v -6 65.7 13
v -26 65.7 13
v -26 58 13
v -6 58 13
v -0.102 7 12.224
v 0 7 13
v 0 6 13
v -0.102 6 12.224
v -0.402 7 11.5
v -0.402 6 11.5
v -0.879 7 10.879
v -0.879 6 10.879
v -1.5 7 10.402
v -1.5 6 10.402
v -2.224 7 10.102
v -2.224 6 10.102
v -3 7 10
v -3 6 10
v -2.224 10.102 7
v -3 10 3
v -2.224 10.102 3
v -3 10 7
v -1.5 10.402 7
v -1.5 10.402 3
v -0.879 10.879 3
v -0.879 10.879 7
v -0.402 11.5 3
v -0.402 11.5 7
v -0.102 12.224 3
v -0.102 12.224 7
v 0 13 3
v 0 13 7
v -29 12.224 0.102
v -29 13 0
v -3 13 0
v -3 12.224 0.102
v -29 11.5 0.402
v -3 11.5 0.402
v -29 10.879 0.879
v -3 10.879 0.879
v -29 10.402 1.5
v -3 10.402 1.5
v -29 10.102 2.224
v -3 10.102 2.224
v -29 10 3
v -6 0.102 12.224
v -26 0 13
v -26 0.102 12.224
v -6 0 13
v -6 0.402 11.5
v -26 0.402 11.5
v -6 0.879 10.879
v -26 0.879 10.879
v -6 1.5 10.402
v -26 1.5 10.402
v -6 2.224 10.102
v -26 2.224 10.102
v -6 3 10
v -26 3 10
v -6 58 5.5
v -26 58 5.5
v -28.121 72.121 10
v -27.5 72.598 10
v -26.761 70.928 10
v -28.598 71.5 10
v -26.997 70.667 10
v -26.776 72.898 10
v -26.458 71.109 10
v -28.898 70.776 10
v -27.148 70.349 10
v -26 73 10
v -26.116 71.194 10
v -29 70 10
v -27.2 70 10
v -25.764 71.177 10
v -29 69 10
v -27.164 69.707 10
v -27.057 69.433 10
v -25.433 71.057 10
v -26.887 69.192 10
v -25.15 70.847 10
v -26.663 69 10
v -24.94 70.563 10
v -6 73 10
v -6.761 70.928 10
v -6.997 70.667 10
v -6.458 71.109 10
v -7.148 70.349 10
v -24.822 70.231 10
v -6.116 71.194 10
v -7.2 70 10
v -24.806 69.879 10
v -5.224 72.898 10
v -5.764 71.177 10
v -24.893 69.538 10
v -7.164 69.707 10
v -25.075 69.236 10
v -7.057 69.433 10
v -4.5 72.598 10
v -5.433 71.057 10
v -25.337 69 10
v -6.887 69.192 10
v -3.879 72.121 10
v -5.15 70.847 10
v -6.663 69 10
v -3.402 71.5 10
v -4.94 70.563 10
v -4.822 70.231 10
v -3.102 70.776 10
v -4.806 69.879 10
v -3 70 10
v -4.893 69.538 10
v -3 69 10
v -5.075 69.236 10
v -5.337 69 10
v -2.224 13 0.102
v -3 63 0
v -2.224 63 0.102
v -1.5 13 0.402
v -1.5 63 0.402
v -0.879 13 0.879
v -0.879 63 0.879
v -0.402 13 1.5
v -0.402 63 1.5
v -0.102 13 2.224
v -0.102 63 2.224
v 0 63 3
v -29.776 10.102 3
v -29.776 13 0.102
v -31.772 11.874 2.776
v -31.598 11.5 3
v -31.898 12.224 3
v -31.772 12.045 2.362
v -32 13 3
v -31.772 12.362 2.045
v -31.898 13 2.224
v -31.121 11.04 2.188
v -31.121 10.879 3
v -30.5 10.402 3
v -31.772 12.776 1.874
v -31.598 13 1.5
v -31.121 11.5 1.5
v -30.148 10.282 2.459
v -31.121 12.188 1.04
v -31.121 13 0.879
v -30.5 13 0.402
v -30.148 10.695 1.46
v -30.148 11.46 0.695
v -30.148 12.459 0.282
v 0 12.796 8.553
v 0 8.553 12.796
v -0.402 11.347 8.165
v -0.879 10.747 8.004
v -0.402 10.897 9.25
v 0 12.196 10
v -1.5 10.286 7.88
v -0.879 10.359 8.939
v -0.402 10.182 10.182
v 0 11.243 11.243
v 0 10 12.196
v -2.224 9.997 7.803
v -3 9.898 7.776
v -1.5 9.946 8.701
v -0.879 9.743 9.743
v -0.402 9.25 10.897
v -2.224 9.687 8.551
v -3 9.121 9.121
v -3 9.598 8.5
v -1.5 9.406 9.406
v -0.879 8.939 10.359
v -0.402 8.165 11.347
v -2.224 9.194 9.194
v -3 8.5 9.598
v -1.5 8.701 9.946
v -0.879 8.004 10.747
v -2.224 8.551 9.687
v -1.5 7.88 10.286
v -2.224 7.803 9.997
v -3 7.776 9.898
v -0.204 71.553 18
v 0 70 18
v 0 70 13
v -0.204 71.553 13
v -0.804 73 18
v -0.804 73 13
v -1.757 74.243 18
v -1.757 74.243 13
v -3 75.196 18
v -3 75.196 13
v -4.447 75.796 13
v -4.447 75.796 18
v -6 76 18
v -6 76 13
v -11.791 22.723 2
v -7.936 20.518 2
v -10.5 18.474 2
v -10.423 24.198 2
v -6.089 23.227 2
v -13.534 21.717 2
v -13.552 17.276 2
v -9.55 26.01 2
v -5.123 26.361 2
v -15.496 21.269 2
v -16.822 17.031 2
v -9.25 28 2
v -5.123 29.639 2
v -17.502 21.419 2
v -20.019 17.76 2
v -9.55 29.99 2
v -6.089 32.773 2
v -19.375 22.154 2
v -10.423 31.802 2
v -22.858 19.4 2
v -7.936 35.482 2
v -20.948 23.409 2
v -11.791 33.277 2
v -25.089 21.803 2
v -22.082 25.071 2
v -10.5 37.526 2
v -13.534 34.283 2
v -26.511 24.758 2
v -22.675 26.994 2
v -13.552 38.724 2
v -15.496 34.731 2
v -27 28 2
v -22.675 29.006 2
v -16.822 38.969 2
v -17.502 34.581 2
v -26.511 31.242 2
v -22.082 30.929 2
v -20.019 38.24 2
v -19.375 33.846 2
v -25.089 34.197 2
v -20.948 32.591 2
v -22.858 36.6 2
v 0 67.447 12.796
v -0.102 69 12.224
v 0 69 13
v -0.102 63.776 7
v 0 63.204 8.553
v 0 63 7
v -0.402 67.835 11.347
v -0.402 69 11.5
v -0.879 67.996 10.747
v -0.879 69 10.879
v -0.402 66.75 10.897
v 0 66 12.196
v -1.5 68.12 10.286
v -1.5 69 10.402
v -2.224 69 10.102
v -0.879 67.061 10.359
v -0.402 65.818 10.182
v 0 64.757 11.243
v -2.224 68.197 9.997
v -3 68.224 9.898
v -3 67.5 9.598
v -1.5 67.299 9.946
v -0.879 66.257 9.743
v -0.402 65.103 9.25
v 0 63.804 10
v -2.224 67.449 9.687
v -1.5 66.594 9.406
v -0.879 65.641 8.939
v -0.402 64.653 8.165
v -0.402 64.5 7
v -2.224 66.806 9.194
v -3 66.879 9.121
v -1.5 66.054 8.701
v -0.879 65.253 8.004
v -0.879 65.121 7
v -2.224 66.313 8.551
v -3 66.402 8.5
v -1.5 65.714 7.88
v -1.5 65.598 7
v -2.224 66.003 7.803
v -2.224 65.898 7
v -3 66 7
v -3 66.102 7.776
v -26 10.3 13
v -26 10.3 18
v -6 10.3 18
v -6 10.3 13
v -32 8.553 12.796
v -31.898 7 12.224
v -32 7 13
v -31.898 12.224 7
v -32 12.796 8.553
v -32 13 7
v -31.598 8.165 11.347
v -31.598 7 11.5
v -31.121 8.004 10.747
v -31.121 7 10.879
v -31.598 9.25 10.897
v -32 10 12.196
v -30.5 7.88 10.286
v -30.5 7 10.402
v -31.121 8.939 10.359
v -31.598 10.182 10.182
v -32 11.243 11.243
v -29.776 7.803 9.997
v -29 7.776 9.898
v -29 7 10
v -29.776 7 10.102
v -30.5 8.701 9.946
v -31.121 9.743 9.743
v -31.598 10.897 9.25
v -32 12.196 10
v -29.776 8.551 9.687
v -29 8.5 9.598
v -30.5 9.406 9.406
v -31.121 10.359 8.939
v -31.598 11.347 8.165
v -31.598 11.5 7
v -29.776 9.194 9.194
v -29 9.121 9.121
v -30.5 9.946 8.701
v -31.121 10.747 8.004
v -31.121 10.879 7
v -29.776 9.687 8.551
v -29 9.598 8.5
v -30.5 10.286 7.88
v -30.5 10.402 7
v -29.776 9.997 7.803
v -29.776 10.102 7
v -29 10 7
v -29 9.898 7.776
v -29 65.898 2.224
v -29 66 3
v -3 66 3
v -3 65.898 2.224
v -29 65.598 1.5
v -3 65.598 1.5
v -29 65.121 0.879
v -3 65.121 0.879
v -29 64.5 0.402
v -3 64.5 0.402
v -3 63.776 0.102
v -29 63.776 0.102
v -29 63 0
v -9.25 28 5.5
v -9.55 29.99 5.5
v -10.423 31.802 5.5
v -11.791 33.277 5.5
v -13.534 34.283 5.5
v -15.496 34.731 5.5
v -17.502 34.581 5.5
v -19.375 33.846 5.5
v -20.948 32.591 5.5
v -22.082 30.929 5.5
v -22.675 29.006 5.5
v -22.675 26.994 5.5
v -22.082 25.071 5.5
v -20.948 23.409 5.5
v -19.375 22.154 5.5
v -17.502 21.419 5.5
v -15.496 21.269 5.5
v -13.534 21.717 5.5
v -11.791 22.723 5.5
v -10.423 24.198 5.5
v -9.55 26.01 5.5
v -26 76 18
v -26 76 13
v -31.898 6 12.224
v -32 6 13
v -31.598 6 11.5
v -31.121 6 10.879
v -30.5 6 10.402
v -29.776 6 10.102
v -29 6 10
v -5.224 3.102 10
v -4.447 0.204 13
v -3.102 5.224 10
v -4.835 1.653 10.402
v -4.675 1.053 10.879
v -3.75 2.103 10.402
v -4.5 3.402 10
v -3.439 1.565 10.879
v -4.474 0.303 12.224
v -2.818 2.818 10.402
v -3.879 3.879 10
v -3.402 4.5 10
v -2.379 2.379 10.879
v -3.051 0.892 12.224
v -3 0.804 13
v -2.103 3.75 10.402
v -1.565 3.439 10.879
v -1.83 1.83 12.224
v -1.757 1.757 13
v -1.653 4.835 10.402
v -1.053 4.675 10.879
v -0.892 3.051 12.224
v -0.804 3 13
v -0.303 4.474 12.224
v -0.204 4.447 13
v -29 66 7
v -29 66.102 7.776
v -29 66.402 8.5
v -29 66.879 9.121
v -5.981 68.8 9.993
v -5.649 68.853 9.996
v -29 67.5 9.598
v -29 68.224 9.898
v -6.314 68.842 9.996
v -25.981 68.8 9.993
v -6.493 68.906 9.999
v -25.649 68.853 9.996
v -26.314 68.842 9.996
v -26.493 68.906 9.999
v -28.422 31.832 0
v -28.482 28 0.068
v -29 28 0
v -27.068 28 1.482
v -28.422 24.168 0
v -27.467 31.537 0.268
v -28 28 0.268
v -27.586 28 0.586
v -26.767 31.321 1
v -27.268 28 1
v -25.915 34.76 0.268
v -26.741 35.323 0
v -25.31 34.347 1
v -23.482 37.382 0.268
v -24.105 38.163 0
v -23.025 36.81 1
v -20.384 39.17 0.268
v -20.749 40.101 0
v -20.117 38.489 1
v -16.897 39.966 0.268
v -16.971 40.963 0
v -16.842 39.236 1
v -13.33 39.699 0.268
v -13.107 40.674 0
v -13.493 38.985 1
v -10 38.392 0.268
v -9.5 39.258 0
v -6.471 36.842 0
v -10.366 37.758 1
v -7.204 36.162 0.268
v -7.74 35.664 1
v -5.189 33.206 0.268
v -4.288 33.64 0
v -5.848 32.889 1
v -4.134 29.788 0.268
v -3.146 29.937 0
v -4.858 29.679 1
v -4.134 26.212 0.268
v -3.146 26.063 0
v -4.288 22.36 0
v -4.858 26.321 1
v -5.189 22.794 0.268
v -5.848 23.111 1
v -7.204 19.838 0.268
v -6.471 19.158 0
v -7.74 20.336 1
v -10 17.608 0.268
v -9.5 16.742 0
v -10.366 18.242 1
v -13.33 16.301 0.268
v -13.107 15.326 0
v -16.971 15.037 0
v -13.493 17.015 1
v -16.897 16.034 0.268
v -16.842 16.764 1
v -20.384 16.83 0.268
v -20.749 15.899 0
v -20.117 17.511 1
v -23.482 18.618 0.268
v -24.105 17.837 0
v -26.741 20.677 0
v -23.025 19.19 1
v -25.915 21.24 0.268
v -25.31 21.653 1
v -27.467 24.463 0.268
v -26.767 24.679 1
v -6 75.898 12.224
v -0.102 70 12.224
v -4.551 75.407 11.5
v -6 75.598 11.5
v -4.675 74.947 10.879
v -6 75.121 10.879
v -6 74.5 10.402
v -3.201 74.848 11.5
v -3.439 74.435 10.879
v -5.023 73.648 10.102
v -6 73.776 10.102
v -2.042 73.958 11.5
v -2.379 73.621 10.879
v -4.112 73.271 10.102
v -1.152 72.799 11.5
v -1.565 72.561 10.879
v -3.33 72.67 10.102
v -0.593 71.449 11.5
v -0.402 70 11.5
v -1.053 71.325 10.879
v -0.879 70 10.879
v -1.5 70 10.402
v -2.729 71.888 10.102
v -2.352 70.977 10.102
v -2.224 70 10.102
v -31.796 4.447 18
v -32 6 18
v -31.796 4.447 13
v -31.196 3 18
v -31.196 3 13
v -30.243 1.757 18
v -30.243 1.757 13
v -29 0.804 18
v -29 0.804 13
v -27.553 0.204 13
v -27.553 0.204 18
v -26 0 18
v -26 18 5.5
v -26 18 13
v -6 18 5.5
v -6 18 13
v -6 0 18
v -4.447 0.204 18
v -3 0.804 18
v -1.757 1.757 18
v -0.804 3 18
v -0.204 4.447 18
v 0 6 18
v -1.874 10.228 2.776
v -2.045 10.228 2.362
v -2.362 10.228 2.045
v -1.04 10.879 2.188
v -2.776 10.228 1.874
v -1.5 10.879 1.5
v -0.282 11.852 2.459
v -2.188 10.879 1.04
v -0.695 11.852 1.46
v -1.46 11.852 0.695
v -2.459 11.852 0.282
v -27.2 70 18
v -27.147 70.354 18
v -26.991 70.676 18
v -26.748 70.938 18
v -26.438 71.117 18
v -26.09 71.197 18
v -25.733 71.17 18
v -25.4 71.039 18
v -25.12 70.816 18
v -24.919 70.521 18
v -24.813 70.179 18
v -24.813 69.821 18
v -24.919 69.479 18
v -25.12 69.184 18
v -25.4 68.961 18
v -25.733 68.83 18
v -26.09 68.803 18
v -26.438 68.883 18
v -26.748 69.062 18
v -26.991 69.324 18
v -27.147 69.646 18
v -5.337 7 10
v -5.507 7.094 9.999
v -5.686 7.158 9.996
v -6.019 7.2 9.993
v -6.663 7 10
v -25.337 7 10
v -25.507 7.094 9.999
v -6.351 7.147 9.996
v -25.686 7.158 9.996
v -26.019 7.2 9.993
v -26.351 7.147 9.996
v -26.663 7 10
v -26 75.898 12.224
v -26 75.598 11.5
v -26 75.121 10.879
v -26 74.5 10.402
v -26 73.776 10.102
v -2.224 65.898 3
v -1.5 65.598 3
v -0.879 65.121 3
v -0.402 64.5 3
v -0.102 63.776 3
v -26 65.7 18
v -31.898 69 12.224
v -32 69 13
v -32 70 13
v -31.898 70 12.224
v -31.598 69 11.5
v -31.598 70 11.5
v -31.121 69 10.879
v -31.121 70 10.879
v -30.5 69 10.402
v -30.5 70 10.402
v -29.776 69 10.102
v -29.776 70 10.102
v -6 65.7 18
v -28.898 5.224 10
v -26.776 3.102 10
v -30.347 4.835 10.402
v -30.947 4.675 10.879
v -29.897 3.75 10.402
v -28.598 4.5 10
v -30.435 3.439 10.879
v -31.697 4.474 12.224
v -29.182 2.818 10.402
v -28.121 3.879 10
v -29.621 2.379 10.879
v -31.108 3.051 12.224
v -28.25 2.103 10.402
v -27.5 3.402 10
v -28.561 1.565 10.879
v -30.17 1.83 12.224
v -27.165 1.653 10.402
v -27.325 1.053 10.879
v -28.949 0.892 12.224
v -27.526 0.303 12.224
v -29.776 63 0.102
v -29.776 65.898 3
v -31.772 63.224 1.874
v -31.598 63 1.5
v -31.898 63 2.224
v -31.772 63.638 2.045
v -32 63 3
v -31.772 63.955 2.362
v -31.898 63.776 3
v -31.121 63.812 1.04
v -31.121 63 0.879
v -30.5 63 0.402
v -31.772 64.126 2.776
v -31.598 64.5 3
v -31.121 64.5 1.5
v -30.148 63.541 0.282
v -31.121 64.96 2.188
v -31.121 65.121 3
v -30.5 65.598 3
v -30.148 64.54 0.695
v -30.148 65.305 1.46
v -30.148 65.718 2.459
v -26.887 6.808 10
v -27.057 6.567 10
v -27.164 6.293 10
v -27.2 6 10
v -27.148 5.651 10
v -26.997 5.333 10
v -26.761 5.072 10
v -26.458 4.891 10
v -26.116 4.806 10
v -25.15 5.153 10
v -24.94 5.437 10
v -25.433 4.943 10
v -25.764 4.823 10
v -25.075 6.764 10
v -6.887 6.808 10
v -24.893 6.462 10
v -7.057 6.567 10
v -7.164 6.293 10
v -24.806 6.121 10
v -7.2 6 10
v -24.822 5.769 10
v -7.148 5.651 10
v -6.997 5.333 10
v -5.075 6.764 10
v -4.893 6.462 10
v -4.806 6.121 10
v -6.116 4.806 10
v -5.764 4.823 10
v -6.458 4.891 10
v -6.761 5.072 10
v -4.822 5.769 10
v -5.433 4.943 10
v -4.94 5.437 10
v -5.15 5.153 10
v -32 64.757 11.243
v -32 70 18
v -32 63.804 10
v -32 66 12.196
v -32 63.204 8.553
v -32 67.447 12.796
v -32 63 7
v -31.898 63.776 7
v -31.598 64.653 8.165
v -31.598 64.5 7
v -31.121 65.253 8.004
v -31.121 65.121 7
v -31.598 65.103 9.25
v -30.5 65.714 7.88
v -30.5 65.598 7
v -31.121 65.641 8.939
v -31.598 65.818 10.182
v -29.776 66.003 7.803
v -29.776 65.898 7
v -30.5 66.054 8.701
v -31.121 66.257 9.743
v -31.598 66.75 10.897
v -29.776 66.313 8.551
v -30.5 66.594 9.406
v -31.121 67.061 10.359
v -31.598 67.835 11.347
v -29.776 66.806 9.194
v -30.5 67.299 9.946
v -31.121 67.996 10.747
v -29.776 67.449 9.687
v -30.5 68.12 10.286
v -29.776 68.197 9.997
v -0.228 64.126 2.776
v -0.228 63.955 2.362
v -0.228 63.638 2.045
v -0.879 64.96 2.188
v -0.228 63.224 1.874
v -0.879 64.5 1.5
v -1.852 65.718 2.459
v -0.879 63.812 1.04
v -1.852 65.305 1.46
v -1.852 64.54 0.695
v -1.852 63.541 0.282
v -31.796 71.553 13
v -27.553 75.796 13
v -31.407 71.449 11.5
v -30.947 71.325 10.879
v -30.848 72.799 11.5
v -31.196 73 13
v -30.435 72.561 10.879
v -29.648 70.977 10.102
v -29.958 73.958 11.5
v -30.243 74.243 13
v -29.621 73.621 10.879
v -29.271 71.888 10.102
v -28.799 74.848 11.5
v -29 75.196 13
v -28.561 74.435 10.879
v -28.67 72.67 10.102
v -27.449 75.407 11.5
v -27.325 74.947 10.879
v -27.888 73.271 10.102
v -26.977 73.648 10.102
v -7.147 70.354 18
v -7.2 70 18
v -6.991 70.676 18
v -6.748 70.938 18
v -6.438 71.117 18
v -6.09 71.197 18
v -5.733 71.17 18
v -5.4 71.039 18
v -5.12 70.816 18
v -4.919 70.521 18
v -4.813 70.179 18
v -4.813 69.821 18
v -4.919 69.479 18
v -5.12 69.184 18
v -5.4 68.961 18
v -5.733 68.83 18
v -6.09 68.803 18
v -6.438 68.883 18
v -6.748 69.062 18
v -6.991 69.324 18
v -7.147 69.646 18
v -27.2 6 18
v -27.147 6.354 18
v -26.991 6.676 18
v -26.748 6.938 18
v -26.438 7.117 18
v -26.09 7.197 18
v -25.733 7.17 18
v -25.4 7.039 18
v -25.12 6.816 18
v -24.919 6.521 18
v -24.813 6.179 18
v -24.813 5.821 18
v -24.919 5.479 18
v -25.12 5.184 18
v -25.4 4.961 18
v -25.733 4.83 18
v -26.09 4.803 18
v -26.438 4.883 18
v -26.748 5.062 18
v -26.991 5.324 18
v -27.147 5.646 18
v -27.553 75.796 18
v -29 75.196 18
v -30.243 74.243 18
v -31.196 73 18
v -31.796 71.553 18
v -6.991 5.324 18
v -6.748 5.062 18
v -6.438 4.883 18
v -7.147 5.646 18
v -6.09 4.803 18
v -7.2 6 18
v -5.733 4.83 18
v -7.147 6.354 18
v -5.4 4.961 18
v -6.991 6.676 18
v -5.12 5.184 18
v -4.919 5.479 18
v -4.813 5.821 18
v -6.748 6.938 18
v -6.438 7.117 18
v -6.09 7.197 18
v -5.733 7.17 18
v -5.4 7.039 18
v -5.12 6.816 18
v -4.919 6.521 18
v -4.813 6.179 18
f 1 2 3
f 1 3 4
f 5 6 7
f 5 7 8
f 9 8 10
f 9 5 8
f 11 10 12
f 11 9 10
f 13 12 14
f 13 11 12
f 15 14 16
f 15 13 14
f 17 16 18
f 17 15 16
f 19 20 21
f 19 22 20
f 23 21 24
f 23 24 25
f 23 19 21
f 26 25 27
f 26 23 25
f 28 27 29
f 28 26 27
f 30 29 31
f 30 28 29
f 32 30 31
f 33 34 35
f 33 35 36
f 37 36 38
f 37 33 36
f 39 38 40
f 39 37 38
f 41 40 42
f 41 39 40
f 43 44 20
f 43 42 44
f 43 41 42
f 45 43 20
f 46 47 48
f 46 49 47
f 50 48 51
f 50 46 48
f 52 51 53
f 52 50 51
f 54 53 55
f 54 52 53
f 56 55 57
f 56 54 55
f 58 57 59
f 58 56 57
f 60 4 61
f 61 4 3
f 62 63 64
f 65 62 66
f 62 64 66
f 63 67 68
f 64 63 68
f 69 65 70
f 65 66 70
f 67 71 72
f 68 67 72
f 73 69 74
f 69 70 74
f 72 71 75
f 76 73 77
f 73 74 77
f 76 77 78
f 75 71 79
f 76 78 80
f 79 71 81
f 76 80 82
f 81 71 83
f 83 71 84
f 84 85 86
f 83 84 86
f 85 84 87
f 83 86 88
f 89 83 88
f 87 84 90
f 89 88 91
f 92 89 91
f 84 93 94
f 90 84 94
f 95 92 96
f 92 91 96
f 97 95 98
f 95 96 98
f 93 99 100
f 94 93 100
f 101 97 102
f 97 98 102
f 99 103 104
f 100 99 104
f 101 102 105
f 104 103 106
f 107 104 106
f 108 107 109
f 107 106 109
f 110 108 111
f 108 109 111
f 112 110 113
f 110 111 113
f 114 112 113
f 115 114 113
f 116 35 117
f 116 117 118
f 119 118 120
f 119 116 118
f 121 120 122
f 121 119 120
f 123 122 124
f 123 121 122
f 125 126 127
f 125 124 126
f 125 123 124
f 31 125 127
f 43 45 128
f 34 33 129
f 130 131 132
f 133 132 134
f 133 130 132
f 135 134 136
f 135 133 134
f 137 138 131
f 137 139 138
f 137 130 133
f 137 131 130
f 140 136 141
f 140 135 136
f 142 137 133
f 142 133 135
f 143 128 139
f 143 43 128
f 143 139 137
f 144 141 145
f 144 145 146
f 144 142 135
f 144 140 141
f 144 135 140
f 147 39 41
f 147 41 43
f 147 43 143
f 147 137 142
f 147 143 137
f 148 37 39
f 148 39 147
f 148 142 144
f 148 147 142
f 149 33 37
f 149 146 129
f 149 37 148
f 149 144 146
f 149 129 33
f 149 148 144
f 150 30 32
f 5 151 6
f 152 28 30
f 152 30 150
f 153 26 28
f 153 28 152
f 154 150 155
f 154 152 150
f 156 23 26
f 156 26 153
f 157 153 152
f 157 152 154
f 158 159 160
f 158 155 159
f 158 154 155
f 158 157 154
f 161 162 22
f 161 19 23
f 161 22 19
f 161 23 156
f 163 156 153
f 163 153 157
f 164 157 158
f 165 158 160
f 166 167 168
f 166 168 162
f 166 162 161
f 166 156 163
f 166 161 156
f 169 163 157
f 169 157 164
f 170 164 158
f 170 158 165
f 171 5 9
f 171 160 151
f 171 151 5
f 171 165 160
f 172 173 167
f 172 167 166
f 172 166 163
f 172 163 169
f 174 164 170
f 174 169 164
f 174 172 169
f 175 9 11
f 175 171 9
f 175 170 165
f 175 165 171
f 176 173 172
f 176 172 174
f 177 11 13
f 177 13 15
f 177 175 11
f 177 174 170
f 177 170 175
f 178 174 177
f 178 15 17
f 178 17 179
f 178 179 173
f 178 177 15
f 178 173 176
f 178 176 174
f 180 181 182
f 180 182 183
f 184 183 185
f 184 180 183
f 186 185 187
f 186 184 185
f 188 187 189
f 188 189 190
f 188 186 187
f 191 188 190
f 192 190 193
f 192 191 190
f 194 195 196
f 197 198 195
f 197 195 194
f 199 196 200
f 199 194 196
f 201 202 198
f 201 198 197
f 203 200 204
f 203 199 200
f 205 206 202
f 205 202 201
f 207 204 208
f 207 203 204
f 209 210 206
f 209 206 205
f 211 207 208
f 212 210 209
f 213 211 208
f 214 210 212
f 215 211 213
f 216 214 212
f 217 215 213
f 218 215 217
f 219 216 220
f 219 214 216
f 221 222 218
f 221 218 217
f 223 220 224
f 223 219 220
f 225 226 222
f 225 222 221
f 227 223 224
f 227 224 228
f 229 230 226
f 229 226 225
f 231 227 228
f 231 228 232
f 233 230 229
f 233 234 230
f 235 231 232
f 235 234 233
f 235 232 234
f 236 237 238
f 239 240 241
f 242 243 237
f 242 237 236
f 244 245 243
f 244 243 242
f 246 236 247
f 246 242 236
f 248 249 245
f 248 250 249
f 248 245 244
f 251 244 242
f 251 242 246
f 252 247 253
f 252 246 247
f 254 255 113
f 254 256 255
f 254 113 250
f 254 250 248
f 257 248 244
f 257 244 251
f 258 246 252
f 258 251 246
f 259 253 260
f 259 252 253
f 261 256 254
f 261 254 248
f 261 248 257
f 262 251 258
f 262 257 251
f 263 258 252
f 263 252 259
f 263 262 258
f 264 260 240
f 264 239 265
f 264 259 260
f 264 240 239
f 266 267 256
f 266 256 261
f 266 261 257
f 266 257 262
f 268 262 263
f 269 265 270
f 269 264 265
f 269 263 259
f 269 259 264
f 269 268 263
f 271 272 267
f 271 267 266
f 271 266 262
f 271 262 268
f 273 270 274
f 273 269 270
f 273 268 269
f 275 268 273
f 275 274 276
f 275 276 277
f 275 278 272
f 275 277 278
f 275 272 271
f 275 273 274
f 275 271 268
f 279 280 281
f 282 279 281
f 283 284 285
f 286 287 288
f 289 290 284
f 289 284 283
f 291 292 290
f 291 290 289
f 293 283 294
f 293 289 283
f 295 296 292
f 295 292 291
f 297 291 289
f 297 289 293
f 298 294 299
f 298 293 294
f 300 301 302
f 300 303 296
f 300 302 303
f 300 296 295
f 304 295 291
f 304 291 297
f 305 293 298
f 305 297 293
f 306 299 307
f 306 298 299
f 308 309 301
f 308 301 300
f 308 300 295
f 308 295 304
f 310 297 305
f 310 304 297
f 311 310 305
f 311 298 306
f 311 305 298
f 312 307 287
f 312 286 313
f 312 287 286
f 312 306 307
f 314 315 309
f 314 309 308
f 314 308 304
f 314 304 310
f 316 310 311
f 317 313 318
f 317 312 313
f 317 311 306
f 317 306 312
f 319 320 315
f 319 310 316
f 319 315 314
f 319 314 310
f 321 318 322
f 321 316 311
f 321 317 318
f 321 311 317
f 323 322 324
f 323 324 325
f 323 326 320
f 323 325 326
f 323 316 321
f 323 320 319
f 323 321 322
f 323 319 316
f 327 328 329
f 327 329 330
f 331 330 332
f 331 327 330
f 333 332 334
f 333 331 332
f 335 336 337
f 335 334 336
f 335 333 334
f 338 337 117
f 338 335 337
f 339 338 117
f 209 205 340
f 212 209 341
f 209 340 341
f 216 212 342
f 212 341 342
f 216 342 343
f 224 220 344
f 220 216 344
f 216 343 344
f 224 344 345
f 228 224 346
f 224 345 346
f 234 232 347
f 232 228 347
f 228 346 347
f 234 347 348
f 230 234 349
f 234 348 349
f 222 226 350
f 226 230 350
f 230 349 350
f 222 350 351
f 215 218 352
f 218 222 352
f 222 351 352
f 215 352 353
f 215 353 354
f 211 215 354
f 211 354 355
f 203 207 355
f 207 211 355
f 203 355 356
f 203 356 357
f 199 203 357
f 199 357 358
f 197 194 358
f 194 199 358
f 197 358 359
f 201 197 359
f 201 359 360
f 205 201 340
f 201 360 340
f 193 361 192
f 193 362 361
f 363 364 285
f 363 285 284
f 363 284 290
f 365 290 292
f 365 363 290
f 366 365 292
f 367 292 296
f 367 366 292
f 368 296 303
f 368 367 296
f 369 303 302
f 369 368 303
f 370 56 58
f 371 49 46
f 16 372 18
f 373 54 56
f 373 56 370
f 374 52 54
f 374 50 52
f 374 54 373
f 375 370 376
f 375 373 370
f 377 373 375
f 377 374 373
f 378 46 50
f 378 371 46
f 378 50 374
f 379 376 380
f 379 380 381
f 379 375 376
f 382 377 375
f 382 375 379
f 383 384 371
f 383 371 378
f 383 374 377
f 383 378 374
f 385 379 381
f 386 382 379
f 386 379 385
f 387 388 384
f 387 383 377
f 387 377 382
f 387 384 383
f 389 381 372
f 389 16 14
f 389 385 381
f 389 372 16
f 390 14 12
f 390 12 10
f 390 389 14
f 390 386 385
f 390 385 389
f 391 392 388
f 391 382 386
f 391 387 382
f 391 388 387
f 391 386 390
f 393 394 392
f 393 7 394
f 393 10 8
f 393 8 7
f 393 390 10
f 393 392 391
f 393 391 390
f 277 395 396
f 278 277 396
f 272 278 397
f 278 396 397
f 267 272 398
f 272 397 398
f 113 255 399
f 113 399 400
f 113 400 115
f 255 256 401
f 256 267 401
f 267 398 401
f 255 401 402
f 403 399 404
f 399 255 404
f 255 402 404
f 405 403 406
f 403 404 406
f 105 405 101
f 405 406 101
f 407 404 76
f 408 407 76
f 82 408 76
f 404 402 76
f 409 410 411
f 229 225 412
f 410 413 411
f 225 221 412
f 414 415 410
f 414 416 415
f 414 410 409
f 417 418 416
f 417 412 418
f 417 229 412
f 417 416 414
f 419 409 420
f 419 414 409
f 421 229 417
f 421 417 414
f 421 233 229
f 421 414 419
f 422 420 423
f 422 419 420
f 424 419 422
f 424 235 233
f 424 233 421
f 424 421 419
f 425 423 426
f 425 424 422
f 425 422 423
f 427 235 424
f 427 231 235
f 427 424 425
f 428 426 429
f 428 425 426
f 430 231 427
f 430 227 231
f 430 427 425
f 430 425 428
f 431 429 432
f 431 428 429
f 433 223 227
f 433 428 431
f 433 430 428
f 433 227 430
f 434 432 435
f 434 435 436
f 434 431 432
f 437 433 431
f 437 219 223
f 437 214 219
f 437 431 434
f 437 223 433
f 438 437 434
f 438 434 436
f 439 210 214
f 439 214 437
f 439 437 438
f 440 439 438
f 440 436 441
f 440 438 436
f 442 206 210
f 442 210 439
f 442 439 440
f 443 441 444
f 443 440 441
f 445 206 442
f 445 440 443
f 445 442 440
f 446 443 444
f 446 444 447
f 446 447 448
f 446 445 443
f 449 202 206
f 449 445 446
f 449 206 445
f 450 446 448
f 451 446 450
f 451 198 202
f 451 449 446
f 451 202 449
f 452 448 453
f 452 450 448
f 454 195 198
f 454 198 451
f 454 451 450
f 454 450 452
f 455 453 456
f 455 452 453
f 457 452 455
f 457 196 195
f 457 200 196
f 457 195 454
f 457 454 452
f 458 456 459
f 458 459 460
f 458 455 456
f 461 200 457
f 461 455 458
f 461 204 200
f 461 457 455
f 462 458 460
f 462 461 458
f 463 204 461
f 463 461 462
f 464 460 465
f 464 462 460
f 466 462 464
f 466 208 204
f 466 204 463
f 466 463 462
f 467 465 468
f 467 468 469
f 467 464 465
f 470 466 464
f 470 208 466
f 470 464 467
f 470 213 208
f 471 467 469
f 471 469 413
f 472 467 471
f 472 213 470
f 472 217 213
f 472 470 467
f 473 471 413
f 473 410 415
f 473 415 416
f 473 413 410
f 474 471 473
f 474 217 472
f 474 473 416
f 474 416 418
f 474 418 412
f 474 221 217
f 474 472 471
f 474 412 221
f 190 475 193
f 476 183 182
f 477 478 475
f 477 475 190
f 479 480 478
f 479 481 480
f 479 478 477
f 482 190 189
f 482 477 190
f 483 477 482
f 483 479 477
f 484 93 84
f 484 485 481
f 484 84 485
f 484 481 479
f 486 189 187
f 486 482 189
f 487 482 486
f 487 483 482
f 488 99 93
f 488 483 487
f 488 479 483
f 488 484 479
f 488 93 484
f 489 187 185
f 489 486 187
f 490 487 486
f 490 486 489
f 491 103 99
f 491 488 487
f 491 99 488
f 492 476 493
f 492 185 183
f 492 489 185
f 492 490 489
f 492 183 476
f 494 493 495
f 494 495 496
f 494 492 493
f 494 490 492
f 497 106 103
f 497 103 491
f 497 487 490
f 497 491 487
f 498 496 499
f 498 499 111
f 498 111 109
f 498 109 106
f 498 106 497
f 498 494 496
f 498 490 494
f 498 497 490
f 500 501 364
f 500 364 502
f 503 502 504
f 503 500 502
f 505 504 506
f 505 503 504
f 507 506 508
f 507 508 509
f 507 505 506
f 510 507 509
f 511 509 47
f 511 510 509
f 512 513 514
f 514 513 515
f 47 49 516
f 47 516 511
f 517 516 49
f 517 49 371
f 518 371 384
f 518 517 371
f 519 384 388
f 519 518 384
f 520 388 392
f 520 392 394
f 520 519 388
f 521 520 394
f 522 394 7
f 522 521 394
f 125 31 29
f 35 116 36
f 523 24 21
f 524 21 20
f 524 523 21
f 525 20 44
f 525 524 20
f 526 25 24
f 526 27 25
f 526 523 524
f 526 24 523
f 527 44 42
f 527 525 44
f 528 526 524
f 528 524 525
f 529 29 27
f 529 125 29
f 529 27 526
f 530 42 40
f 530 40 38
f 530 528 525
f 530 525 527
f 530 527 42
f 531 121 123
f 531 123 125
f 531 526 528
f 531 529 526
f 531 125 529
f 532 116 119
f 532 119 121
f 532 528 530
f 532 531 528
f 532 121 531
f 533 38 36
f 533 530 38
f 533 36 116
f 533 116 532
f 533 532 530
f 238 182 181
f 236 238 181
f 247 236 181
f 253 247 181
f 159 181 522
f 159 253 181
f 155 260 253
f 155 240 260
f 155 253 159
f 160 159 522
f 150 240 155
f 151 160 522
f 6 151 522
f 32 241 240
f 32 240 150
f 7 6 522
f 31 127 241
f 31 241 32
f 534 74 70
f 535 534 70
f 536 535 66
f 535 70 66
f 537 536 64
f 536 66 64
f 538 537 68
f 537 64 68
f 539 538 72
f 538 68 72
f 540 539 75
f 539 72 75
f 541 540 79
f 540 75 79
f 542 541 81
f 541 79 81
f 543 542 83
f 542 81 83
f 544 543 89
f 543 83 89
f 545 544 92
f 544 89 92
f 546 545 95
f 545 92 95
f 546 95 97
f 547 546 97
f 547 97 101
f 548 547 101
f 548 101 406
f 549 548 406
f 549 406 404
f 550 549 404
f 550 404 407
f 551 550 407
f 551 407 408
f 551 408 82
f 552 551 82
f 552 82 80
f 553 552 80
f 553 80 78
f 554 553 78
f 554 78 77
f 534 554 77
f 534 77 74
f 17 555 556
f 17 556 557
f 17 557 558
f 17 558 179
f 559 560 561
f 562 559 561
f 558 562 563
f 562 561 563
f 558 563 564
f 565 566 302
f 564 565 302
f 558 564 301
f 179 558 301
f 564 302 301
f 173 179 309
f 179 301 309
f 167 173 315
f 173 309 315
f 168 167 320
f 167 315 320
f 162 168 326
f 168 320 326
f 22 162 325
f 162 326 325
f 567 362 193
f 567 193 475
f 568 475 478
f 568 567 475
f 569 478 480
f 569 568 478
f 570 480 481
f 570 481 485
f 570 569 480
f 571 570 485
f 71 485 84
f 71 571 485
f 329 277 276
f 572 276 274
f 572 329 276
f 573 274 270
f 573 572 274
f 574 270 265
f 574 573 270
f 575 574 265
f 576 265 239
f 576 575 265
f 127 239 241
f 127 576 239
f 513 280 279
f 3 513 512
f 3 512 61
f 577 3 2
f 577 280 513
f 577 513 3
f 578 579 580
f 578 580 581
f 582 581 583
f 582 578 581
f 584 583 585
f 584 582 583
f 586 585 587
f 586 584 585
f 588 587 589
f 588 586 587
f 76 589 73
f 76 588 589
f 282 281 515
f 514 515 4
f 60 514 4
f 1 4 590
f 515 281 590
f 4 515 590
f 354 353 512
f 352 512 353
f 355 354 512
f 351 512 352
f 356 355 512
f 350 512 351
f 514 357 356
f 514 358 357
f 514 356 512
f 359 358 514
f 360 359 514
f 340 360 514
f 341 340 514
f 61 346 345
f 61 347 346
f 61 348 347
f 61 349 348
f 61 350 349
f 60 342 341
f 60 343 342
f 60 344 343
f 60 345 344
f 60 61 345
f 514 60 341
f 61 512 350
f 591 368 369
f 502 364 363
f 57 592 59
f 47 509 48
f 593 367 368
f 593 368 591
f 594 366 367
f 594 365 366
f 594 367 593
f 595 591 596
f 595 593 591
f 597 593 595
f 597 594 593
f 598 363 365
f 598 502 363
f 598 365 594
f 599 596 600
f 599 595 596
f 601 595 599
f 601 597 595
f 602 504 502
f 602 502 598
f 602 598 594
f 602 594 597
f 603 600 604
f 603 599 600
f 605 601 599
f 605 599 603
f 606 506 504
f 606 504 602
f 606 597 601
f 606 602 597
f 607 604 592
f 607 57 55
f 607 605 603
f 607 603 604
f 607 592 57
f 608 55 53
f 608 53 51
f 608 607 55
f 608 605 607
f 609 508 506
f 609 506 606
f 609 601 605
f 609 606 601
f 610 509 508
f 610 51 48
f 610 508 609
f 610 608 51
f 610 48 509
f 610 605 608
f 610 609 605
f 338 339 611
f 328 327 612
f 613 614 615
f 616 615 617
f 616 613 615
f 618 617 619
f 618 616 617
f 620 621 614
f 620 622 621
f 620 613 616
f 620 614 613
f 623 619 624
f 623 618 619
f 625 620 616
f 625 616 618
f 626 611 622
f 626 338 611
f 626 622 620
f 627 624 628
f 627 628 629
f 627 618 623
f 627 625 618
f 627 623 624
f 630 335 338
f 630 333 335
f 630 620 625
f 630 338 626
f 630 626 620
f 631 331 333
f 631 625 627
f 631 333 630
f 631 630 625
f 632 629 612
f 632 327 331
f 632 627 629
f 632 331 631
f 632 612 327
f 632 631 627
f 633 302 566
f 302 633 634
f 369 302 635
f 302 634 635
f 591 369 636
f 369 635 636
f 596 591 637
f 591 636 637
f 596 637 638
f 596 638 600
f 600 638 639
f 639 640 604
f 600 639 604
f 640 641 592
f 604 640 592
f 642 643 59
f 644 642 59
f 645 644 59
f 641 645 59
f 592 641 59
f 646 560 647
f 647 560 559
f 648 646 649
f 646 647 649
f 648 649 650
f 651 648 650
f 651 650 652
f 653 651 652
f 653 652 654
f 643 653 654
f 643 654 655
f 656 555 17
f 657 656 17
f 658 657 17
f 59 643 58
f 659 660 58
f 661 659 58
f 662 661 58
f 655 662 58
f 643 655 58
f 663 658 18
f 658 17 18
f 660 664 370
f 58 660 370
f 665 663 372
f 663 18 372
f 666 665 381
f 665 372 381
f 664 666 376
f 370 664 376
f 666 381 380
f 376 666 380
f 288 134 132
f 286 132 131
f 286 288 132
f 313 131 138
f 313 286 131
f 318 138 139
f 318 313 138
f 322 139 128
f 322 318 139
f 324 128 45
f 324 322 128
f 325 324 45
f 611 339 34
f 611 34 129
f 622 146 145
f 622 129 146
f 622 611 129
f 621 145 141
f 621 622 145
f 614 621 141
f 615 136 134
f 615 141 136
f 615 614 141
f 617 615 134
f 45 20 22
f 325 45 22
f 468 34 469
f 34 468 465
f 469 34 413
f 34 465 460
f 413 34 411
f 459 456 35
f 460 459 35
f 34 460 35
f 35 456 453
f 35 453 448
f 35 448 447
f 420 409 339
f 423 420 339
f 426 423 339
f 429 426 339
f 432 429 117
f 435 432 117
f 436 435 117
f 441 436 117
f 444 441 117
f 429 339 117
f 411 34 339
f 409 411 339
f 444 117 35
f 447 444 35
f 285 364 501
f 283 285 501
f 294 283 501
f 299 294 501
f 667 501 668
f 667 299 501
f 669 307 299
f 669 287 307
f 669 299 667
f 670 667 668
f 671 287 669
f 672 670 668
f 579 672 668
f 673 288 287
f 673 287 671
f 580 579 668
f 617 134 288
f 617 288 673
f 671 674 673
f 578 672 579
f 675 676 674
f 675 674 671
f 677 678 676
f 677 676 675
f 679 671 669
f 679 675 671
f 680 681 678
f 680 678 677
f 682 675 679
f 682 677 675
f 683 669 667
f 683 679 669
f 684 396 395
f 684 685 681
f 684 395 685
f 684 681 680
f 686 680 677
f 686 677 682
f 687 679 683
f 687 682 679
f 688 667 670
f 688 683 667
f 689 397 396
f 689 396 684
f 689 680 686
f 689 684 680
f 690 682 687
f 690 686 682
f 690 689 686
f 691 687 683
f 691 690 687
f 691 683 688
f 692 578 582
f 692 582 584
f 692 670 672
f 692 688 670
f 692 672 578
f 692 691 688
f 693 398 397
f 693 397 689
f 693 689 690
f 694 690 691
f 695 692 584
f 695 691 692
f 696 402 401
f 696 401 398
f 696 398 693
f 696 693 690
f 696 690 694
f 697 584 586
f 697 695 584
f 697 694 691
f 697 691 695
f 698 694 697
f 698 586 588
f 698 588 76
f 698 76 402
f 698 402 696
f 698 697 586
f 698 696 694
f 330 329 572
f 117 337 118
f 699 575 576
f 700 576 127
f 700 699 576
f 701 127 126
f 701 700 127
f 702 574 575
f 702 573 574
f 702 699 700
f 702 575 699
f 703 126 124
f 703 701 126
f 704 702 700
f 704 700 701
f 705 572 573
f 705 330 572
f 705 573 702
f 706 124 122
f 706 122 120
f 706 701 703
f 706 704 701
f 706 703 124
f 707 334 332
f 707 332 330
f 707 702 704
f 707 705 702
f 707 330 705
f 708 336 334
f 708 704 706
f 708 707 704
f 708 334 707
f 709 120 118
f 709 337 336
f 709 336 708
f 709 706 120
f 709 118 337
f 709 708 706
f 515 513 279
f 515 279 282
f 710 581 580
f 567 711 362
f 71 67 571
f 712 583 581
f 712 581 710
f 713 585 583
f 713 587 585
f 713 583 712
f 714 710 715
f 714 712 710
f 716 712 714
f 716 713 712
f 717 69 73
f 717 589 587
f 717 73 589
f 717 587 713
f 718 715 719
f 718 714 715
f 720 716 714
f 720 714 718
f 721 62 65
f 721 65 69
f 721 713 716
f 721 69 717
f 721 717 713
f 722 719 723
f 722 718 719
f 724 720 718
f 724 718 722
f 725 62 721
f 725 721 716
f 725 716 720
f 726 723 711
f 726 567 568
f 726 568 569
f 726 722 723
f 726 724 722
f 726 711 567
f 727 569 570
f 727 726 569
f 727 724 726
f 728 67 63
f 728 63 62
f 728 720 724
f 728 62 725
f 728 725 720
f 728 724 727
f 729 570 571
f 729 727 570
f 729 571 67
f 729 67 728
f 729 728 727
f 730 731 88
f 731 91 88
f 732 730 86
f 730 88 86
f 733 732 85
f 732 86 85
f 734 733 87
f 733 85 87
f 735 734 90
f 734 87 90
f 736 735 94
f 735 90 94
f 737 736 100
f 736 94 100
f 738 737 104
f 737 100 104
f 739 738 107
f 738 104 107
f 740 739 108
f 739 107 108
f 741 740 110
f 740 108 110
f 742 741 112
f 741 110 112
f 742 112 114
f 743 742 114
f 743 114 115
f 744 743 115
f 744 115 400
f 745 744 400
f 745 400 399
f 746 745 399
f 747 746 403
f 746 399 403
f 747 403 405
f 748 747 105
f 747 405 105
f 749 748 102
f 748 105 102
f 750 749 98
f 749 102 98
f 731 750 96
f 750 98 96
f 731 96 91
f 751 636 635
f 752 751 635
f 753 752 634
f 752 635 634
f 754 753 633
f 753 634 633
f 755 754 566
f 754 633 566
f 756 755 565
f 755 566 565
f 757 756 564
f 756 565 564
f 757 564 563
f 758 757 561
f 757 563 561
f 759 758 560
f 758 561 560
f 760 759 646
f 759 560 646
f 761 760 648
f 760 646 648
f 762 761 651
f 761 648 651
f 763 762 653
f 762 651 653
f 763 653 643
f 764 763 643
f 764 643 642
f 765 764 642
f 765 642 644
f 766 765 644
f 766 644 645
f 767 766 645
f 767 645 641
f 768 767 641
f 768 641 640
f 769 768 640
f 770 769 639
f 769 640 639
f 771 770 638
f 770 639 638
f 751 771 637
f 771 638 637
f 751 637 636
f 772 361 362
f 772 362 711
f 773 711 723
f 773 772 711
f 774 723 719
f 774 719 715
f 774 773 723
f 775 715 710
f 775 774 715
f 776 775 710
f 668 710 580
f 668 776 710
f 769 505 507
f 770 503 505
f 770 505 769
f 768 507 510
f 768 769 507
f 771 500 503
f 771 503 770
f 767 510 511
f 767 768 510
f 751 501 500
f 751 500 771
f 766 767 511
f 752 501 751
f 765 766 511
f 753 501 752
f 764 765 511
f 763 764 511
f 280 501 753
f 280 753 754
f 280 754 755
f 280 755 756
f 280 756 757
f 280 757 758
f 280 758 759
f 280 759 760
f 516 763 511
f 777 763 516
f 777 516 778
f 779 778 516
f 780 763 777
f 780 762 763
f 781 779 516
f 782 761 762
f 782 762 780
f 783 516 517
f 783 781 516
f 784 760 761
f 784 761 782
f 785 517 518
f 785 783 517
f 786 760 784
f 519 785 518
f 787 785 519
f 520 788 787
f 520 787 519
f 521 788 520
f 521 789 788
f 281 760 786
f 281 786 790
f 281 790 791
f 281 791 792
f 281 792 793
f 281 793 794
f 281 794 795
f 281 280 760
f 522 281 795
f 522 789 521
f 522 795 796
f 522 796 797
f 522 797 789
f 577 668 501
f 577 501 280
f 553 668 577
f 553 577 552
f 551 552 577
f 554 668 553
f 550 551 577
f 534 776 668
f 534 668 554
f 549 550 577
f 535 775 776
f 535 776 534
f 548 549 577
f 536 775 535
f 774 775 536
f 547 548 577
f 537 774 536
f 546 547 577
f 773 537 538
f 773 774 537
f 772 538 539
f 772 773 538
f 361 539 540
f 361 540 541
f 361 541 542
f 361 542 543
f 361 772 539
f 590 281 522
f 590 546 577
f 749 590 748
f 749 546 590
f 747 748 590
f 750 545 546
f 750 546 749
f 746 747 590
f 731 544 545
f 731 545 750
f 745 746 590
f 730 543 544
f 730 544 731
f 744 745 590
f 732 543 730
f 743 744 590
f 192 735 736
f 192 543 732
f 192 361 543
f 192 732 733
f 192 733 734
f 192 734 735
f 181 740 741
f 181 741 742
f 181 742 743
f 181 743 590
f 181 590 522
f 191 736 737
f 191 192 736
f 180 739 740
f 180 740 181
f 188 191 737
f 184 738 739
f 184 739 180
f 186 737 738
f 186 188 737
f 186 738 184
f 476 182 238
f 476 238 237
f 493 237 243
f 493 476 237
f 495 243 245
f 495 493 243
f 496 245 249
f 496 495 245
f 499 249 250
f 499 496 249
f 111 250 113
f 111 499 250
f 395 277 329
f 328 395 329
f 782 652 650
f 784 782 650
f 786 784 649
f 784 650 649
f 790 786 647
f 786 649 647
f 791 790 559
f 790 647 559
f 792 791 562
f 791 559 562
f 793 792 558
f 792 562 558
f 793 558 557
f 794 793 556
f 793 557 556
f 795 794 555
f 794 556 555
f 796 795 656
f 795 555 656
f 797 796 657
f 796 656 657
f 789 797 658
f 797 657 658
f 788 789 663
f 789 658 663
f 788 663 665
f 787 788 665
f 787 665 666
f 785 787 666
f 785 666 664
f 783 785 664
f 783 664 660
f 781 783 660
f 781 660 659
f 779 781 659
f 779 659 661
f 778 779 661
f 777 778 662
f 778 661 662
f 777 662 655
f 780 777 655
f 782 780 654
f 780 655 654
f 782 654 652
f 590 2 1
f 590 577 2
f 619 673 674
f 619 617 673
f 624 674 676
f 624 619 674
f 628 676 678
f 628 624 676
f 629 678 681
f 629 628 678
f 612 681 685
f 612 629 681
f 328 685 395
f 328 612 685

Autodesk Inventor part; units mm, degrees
ref_plane "YZ Plane" through (0, 0, 0) normal (1, 0, 0) x (0, 1, 0)
ref_plane "XZ Plane" through (0, 0, 0) normal (0, 1, 0) x (-1, 0, 0)
ref_plane "XY Plane" through (0, 0, 0) normal (0, 0, 1) x (1, 0, 0)
sketch "Sketch1" plane through (0, 0, 0) normal (0, 0, 1) x (1, 0, 0)
  line L0 (0, 0) -> (-32, 0)
  line L1 (-32, 0) -> (-32, 76)
  line L2 (-32, 76) -> (0, 76)
  line L3 (0, 76) -> (0, 0)
  dimension "d0" = 32
  dimension "d1" = 76
extrude "Extrusion1" add sketch "Sketch1" along normal blind 18
fillet "Fillet1" radius 6 4 edges at (0, 76, 9) (-32, 76, 9) (0, 0, 9) (-32, 0, 9)
sketch "Sketch2" plane through (0, 0, 18) normal (0, 0, 1) x (1, 0, 0)
  line L0 (-6, 58) -> (-26, 58)
  line L1 (-26, 58) -> (-26, 18)
  line L2 (-26, 18) -> (-6, 18)
  line L3 (-6, 18) -> (-6, 58)
  line L4 (-6, 76) -> (-26, 76) projected
  line L5 (0, 6) -> (0, 70) projected
  point P0 (0, 0)
  dimension "d5" = 20
  dimension "d6" = 40
  dimension "d7" = 18
  dimension "d8" = 6
extrude "Extrusion2" cut sketch "Sketch2" against normal blind 12.5
sketch "Sketch3" plane through (0, 0, 5.5) normal (0, 0, 1) x (1, 0, 0)
  circle A0 centre (-16, 28) radius 6.75
  line L0 (-6, 58) -> (-6, 18) projected
  line L1 (-6, 18) -> (-26, 18) projected
  point P0 (0, 0)
  dimension "d11" = 13.5
  dimension "d12" = 10
  dimension "d13" = 10
extrude "Extrusion3" cut sketch "Sketch3" against normal up to surface (5.5 mm away)
sketch "Sketch4" plane through (0, 0, 18) normal (0, 0, 1) x (1, 0, 0)
  line L0 (-26, 58) -> (-6, 58) projected
  line L1 (-6, 58) -> (-26, 58)
  line L2 (-26, 58) -> (-26, 65.7)
  line L3 (-26, 65.7) -> (-6, 65.7)
  line L4 (-6, 65.7) -> (-6, 58)
  line L5 (-6, 18) -> (-26, 18) projected
  line L6 (-6, 18) -> (-26, 18)
  line L7 (-26, 18) -> (-26, 10.3)
  line L8 (-26, 10.3) -> (-6, 10.3)
  line L9 (-6, 10.3) -> (-6, 18)
  point P0 (0, 0)
  point P1 (-26, 18)
  dimension "d16" = 7.7
  dimension "d17" = 20
  dimension "d18" = 7.7
extrude "Extrusion4" cut sketch "Sketch4" against normal blind 5
sketch "Sketch5" plane through (0, 6, 0) normal (1, 0, 0) x (0, 0, -1)
  line L0 (0, -6) -> (-18, -6) projected
  line L1 (0, -6) -> (0, 4)
  line L2 (0, 0) -> (0, -6) projected
  line L3 (0, 4) -> (-10, 4)
  line L4 (-10, 4) -> (-10, -6)
  line L5 (0, 70) -> (0, 64) projected
  line L6 (0, 70) -> (-10, 70)
  line L7 (-10, 70) -> (-10, 60)
  line L8 (-10, 60) -> (0, 60)
  line L9 (0, 60) -> (0, 70)
  dimension "d21" = 10
  dimension "d22" = 10
  dimension "d23" = 10
  dimension "d24" = 10
extrude "Extrusion5" cut sketch "Sketch5" against normal up to surface (32 mm away)
fillet "Fillet2" radius 3 20 edges at (-16, 66, 0) (0, 38, 0) (-16, 10, 0) (-32, 38, 0) (0, 66, 5) (-32, 66, 5) (0, 10, 5) (-16, 66, 10) (-32, 10, 5) (-16, 10, 10) (-16, 76, 10) (-30.2426, 74.2426, 10) (-32, 68, 10) (0, 68, 10) (-1.7574, 74.2426, 10) (-1.7574, 1.7574, 10) (0, 8, 10) (-30.2426, 1.7574, 10) (-32, 8, 10) (-16, 0, 10)
sketch "Sketch6" plane through (-3, 69, 10) normal (0, 0, -1) x (-1, 0, 0)
  arc A0 (26, 1) -> (23, 4) centre (23, 1) ccw projected
  circle A1 centre (23, 1) radius 1.2
  arc A2 (3, 4) -> (0, 1) centre (3, 1) ccw projected
  circle A3 centre (3, 1) radius 1.2
  arc A4 (0, -63) -> (3, -66) centre (3, -63) ccw projected
  circle A5 centre (3, -63) radius 1.2
  arc A6 (23, -66) -> (26, -63) centre (23, -63) ccw projected
  circle A7 centre (23, -63) radius 1.2
  point P0 (-3, -69)
  dimension "d28" = 2.4
  dimension "d29" = 2.4
  dimension "d30" = 2.4
  dimension "d31" = 2.4
extrude "Extrusion6" cut sketch "Sketch6" along normal blind 5 and the other way blind 10
sketch "Sketch7" plane through (0, 0, 0) normal (0, 0, -1) x (-1, 0, 0)
  circle A0 centre (16, 28) radius 6.75 projected
  circle A1 centre (16, 28) radius 11
  point P0 (0, 0)
  dimension "d36" = 22
extrude "Extrusion7" cut sketch "Sketch7" against normal blind 2
fillet "Fillet3" radius 2 1 edges at (-5, 28, 0)
properties part number "ramie03-5"
